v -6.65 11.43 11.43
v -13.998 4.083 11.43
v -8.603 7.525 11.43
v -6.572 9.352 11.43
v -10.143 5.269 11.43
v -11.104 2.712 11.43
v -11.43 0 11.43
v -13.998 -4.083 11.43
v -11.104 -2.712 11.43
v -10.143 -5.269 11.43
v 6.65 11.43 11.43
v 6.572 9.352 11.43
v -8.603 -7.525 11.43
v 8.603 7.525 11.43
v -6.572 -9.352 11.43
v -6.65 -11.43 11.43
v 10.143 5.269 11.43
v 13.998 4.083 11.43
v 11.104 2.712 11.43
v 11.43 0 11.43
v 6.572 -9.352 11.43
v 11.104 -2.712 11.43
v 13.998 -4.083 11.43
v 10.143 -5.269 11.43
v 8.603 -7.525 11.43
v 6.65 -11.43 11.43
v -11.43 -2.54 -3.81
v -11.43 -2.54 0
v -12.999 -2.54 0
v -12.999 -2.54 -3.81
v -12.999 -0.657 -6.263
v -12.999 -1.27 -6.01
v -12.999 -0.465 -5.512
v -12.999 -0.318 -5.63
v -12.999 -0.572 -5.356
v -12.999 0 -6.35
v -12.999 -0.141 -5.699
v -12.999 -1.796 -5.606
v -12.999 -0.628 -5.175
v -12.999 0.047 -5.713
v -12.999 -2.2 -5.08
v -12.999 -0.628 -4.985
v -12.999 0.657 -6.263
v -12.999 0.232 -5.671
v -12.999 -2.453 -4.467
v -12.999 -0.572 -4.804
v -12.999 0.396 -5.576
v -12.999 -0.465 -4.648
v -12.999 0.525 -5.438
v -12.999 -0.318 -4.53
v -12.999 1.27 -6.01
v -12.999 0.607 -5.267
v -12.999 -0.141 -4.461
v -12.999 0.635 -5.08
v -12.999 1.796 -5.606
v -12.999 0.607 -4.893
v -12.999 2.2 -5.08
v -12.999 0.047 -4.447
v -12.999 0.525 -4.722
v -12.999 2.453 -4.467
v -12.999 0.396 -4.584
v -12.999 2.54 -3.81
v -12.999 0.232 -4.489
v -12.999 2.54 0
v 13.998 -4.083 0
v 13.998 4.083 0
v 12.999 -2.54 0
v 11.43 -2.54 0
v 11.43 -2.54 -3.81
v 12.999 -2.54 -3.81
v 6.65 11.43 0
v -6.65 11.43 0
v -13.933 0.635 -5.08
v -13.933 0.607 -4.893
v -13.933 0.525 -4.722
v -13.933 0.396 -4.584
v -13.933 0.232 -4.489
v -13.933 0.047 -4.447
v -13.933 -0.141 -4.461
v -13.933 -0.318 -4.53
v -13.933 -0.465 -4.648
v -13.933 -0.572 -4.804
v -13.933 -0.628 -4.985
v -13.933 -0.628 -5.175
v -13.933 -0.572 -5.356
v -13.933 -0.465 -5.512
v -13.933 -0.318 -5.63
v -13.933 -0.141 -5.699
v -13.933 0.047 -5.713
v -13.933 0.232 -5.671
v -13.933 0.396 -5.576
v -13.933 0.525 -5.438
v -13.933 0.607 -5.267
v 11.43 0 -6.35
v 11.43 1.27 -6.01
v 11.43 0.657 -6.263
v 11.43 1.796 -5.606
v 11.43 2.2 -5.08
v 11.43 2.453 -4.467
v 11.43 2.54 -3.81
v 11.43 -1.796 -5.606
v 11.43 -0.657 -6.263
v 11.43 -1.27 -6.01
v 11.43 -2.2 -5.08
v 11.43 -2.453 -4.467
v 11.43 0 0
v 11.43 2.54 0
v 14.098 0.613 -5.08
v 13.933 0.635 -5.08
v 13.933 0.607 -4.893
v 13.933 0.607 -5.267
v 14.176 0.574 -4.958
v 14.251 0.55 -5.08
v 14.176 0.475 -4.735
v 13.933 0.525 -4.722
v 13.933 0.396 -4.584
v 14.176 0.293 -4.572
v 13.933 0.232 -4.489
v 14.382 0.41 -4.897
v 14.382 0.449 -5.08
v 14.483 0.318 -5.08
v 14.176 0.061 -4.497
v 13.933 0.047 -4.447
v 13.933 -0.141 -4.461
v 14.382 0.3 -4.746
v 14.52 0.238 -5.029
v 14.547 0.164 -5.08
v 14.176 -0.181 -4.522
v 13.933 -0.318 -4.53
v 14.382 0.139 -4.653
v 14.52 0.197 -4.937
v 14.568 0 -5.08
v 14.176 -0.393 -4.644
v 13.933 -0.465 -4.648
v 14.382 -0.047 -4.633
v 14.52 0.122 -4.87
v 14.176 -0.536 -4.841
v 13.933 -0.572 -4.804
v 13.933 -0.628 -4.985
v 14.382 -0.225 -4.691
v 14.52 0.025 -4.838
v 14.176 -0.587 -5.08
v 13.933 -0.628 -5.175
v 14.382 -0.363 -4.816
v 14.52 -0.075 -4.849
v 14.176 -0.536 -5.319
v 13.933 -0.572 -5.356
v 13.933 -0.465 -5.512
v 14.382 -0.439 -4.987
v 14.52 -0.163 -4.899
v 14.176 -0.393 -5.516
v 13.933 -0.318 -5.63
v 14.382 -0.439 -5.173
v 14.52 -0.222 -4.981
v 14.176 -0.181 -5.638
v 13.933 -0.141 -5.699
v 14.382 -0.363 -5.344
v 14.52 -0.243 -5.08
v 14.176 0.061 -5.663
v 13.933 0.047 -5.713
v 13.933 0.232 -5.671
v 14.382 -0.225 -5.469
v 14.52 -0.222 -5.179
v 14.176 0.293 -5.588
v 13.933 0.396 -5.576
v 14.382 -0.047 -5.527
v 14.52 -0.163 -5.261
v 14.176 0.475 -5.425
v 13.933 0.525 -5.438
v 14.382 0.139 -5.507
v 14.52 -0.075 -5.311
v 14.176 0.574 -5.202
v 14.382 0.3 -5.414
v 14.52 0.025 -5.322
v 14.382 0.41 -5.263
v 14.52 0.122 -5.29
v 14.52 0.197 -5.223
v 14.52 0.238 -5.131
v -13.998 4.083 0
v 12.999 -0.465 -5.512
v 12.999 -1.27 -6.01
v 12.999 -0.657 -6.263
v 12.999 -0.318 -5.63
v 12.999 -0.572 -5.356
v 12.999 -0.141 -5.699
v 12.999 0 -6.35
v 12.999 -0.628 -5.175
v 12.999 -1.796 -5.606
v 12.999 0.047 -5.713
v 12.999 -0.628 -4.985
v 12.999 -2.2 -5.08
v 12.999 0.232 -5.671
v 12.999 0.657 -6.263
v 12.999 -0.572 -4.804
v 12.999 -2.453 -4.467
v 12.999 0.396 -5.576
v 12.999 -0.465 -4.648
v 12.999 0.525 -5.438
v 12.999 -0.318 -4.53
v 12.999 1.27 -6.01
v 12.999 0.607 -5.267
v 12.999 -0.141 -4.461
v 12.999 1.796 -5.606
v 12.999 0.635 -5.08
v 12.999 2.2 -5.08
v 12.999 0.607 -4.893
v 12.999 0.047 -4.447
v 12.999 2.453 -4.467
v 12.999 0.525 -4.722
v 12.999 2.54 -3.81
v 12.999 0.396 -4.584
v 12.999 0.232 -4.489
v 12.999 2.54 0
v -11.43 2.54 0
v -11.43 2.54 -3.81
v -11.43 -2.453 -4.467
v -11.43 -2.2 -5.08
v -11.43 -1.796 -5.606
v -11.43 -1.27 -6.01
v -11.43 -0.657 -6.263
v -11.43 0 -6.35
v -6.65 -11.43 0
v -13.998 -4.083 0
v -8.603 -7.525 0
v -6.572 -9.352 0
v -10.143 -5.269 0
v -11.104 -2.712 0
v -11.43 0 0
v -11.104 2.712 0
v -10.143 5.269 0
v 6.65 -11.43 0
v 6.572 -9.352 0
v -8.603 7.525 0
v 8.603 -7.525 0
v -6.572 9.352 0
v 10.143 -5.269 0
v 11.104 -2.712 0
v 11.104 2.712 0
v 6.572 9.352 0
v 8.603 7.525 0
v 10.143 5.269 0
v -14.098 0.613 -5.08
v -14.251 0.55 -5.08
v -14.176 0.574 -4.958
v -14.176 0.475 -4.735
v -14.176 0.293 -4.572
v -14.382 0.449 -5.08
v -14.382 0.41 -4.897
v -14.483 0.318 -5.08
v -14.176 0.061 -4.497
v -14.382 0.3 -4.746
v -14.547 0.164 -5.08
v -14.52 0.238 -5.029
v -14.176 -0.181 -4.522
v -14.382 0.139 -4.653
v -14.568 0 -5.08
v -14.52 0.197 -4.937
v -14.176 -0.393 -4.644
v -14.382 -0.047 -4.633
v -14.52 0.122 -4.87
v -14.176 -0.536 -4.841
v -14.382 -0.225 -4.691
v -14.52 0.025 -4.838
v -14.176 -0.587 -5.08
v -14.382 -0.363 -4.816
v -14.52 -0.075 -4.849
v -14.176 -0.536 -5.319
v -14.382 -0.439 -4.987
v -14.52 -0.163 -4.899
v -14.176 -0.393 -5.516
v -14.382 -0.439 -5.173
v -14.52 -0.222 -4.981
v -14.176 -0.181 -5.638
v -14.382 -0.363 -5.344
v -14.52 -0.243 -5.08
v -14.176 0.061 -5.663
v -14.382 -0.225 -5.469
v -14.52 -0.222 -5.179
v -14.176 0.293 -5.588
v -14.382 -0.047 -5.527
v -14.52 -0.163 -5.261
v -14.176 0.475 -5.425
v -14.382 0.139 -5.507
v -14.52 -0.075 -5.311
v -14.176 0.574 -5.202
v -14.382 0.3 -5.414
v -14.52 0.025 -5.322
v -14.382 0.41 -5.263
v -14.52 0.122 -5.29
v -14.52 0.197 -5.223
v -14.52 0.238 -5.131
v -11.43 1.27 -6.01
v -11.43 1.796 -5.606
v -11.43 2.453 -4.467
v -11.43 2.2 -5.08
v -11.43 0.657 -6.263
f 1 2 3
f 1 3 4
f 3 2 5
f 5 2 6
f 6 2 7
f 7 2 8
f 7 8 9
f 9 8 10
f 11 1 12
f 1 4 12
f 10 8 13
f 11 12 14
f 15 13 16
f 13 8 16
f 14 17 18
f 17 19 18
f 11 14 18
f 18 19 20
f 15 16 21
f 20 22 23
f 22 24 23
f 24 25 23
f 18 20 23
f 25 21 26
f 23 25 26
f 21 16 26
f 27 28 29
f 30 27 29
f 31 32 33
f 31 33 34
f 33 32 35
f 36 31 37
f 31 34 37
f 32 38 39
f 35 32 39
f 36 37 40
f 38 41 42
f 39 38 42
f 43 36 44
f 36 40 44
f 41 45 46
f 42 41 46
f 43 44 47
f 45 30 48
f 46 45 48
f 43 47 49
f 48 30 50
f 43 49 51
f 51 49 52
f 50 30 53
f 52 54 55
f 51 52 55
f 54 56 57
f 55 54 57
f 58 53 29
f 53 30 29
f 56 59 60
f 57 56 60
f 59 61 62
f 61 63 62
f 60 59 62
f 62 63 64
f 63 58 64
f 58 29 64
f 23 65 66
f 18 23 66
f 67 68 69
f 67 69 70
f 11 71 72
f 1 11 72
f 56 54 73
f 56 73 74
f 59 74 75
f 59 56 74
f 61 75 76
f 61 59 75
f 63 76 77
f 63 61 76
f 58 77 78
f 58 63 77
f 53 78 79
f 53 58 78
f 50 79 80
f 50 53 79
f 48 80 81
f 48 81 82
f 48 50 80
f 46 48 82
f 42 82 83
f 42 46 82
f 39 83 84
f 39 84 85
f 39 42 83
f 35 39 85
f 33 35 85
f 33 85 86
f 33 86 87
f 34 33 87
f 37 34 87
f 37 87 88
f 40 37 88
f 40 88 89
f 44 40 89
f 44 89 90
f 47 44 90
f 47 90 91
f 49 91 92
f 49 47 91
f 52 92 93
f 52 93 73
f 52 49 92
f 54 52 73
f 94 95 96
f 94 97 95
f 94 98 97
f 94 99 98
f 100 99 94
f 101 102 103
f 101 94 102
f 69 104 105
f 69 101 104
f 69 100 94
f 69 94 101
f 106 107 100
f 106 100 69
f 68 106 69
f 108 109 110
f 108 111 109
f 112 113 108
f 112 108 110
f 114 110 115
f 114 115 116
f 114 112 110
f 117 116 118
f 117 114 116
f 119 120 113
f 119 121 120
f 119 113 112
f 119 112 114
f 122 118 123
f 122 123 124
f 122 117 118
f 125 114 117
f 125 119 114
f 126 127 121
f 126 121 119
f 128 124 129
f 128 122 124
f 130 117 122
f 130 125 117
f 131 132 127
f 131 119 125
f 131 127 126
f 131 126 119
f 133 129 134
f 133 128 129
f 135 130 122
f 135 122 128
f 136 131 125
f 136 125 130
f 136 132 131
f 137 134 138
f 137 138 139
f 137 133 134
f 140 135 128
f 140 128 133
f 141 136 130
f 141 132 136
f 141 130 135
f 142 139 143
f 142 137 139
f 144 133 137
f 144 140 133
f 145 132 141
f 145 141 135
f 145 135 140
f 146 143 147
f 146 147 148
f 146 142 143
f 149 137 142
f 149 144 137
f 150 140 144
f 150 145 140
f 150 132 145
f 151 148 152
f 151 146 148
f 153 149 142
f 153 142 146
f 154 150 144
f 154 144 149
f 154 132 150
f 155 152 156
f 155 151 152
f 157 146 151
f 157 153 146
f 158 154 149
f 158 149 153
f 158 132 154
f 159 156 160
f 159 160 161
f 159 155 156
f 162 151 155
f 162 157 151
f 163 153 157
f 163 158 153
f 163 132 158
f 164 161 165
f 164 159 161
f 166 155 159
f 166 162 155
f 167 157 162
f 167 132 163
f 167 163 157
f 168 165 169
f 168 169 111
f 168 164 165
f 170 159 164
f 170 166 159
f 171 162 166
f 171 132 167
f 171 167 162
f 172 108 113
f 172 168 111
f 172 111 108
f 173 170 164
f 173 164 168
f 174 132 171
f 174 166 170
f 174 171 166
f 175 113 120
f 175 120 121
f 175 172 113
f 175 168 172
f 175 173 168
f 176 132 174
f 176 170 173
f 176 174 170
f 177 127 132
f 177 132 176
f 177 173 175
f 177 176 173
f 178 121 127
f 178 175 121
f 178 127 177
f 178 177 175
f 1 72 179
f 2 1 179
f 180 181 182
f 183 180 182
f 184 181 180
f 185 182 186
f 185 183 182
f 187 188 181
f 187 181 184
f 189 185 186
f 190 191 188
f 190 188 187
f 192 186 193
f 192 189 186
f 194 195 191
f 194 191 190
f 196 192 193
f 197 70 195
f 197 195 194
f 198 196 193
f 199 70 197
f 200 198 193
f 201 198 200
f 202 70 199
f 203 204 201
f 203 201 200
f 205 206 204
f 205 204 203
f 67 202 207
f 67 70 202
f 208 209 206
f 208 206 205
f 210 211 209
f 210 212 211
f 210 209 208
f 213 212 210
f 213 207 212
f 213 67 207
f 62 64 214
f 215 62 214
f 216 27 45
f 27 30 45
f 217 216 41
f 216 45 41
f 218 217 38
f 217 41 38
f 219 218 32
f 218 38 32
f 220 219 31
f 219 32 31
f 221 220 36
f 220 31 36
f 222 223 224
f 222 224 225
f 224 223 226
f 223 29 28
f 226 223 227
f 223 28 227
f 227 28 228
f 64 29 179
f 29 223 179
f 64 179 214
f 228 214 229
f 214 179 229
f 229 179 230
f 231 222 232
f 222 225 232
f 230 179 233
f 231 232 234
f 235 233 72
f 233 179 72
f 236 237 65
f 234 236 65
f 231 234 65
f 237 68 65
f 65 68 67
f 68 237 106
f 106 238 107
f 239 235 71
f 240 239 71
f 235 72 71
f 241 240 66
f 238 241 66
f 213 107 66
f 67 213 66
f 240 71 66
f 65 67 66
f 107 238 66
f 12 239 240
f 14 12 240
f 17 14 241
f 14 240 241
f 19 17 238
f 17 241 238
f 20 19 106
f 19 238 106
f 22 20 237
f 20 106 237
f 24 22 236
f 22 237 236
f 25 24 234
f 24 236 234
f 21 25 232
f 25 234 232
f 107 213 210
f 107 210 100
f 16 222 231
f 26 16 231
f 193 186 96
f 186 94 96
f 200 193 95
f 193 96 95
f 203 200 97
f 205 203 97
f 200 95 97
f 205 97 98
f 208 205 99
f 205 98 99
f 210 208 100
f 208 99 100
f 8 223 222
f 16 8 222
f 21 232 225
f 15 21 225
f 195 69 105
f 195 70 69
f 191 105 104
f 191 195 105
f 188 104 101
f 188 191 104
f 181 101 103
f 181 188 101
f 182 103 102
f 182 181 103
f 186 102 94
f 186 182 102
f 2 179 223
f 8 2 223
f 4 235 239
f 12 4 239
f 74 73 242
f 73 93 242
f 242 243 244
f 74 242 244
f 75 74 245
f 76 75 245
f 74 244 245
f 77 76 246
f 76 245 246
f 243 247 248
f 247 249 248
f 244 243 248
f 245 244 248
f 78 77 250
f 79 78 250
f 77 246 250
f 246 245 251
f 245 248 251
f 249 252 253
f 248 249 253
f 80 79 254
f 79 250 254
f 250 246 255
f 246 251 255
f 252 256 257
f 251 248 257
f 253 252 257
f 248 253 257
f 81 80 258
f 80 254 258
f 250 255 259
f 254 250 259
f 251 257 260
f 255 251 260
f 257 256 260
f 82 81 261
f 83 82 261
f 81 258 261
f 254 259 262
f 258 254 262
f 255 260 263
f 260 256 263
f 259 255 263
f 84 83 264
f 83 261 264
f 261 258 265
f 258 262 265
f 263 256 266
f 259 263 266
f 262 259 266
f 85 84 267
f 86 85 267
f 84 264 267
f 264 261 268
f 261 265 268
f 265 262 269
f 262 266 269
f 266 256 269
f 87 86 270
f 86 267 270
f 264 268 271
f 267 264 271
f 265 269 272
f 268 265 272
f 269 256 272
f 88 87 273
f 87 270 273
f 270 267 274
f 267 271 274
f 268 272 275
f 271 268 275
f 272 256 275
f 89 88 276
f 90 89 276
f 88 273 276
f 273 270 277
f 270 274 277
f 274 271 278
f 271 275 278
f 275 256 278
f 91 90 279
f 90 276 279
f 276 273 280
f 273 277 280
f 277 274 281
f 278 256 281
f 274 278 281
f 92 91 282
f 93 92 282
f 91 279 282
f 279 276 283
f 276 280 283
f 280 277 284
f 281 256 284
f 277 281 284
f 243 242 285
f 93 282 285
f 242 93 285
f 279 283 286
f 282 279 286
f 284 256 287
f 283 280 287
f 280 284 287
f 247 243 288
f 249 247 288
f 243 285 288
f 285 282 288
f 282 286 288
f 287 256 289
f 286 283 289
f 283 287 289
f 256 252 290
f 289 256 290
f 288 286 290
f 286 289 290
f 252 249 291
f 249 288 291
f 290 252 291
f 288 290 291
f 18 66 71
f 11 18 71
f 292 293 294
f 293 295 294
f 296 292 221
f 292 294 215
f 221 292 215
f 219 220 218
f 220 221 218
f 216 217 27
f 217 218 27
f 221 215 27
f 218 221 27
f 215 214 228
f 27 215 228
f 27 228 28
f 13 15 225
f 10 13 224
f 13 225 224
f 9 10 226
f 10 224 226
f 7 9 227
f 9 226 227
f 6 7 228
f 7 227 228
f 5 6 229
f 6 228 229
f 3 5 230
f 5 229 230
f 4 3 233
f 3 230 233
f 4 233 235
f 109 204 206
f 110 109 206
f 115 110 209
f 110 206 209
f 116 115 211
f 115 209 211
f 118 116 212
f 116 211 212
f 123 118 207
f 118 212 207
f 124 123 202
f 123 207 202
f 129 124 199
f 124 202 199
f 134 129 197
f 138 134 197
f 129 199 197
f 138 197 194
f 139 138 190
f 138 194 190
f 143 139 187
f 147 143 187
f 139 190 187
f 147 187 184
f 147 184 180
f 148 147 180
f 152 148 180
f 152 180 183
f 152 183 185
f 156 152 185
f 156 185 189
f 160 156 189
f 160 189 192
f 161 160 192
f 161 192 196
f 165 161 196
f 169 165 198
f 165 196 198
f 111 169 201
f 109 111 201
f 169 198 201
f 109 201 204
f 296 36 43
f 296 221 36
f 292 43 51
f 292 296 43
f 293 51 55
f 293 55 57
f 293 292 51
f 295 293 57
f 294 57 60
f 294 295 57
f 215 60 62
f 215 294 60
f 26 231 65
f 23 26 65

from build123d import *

# Parameters (mm, degrees)
F1_DEPTH  = 22.86
F3_DEPTH  = 6.35
F4_R      = 0.635
F5_DEPTH  = 1.5691231
F6_R      = 2.53999
F7_R      = 0.635
F9_DEPTH  = 6.35
F11_D     = 2.54
F16_D     = 127
F16_DEPTH = 17.781


# Not quite as in the source:
# - a fillet or chamfer is up to 0.001 mm smaller than in the source, because OpenCascade refuses the exact size
# - a length typed as a fraction of an inch, garbled in the dataset ("3 / 203.2 mm" for 3/8 in), is restored
# - the program builds the solid bodies; features that only make, move or delete a surface that nothing else refers to are left out


with BuildPart() as f1:
    # F0 (on Top) → F1 (new body)
    with BuildSketch(Plane.XY):
        Polygon((6.6501818182, 11.43), (0, 11.43), (-6.6501818182, 11.43), (-13.9976640991, 4.0825177191), (-13.9976640991, 0), (-13.9976640991, -4.0825177191), (-6.6501818182, -11.43), (0, -11.43), (6.6501818182, -11.43), (13.9976640991, -4.0825177191), (13.9976640991, 0), (13.9976640991, 4.0825177191), align=None)
        with BuildLine():
            ThreePointArc((6.5717879374, 9.3518181818), (10.1429886159, 5.26922024), (11.43, 0))
            ThreePointArc((11.43, 0), (10.1429886159, -5.26922024), (6.5717879374, -9.3518181818))
            Line((6.5717879374, -9.3518181818), (0, -9.3518181818))
            Line((0, -9.3518181818), (-6.5717879374, -9.3518181818))
            ThreePointArc((-6.5717879374, -9.3518181818), (-10.1429886159, -5.26922024), (-11.43, 0))
            ThreePointArc((-11.43, 0), (-10.1429886159, 5.26922024), (-6.5717879374, 9.3518181818))
            Line((-6.5717879374, 9.3518181818), (0, 9.3518181818))
            Line((0, 9.3518181818), (6.5717879374, 9.3518181818))
        make_face(mode=Mode.SUBTRACT)
    extrude(amount=F1_DEPTH)

    # F2 (on Top) → F3 (join)
    with BuildSketch(Plane.XY):
        Polygon((12.9991231, -2.54), (12.9991231, 0), (12.9991231, 2.54), (11.43, 2.54), (11.43, 0), (11.43, -2.54), align=None)
    extrude(amount=-F3_DEPTH)

    # F4 (on face) → F5 (join)
    with BuildSketch(Plane.YZ.offset(12.9991231)):
        with Locations((0, -5.08)):
            Circle(F4_R)
    extrude(amount=F5_DEPTH)

    # F6 (radius 2.54 in the source; OpenCascade refuses exactly that, so slightly less here)
    f6_edges = [f1.edges().sort_by_distance(p)[0] for p in [
        (12.214562, -2.54, -6.35),
        (12.214562, 2.54, -6.35),
    ]]
    fillet(f6_edges, radius=F6_R)

    # F7
    f7_edges = [f1.edges().sort_by_distance(p)[0] for p in [
        (14.568246, -0.635, -5.08),
    ]]
    fillet(f7_edges, radius=F7_R)

    # F8 (on face) → F9 (join)
    with BuildSketch(Plane.XY.offset(22.86)):
        Polygon((13.9976640991, 2.54), (12.4285360385, 2.54), (12.4285360385, 0), (12.4285360385, -2.54), (13.9976640991, -2.54), (13.9976640991, 0), align=None)
    extrude(amount=F9_DEPTH)

    # F11 (through all)
    with Locations(Plane.YZ.offset(13.9976640991)):
        with Locations((0, 26.67)):
            Hole(F11_D / 2)

    # F12: F1 across plane


with BuildPart() as f1_1:
    add(f1.part)
    add(f1.part.mirror(Plane.YZ))

    # F16 (through all, one way)
    with BuildSketch(Plane(origin=(0, 0, 11.43), x_dir=(1, 0, 0), z_dir=(0, 0, -1))):
        with Locations((0, 0)):
            Circle(F16_D / 2)
    extrude(amount=-F16_DEPTH, mode=Mode.SUBTRACT)


solid = f1_1.part
